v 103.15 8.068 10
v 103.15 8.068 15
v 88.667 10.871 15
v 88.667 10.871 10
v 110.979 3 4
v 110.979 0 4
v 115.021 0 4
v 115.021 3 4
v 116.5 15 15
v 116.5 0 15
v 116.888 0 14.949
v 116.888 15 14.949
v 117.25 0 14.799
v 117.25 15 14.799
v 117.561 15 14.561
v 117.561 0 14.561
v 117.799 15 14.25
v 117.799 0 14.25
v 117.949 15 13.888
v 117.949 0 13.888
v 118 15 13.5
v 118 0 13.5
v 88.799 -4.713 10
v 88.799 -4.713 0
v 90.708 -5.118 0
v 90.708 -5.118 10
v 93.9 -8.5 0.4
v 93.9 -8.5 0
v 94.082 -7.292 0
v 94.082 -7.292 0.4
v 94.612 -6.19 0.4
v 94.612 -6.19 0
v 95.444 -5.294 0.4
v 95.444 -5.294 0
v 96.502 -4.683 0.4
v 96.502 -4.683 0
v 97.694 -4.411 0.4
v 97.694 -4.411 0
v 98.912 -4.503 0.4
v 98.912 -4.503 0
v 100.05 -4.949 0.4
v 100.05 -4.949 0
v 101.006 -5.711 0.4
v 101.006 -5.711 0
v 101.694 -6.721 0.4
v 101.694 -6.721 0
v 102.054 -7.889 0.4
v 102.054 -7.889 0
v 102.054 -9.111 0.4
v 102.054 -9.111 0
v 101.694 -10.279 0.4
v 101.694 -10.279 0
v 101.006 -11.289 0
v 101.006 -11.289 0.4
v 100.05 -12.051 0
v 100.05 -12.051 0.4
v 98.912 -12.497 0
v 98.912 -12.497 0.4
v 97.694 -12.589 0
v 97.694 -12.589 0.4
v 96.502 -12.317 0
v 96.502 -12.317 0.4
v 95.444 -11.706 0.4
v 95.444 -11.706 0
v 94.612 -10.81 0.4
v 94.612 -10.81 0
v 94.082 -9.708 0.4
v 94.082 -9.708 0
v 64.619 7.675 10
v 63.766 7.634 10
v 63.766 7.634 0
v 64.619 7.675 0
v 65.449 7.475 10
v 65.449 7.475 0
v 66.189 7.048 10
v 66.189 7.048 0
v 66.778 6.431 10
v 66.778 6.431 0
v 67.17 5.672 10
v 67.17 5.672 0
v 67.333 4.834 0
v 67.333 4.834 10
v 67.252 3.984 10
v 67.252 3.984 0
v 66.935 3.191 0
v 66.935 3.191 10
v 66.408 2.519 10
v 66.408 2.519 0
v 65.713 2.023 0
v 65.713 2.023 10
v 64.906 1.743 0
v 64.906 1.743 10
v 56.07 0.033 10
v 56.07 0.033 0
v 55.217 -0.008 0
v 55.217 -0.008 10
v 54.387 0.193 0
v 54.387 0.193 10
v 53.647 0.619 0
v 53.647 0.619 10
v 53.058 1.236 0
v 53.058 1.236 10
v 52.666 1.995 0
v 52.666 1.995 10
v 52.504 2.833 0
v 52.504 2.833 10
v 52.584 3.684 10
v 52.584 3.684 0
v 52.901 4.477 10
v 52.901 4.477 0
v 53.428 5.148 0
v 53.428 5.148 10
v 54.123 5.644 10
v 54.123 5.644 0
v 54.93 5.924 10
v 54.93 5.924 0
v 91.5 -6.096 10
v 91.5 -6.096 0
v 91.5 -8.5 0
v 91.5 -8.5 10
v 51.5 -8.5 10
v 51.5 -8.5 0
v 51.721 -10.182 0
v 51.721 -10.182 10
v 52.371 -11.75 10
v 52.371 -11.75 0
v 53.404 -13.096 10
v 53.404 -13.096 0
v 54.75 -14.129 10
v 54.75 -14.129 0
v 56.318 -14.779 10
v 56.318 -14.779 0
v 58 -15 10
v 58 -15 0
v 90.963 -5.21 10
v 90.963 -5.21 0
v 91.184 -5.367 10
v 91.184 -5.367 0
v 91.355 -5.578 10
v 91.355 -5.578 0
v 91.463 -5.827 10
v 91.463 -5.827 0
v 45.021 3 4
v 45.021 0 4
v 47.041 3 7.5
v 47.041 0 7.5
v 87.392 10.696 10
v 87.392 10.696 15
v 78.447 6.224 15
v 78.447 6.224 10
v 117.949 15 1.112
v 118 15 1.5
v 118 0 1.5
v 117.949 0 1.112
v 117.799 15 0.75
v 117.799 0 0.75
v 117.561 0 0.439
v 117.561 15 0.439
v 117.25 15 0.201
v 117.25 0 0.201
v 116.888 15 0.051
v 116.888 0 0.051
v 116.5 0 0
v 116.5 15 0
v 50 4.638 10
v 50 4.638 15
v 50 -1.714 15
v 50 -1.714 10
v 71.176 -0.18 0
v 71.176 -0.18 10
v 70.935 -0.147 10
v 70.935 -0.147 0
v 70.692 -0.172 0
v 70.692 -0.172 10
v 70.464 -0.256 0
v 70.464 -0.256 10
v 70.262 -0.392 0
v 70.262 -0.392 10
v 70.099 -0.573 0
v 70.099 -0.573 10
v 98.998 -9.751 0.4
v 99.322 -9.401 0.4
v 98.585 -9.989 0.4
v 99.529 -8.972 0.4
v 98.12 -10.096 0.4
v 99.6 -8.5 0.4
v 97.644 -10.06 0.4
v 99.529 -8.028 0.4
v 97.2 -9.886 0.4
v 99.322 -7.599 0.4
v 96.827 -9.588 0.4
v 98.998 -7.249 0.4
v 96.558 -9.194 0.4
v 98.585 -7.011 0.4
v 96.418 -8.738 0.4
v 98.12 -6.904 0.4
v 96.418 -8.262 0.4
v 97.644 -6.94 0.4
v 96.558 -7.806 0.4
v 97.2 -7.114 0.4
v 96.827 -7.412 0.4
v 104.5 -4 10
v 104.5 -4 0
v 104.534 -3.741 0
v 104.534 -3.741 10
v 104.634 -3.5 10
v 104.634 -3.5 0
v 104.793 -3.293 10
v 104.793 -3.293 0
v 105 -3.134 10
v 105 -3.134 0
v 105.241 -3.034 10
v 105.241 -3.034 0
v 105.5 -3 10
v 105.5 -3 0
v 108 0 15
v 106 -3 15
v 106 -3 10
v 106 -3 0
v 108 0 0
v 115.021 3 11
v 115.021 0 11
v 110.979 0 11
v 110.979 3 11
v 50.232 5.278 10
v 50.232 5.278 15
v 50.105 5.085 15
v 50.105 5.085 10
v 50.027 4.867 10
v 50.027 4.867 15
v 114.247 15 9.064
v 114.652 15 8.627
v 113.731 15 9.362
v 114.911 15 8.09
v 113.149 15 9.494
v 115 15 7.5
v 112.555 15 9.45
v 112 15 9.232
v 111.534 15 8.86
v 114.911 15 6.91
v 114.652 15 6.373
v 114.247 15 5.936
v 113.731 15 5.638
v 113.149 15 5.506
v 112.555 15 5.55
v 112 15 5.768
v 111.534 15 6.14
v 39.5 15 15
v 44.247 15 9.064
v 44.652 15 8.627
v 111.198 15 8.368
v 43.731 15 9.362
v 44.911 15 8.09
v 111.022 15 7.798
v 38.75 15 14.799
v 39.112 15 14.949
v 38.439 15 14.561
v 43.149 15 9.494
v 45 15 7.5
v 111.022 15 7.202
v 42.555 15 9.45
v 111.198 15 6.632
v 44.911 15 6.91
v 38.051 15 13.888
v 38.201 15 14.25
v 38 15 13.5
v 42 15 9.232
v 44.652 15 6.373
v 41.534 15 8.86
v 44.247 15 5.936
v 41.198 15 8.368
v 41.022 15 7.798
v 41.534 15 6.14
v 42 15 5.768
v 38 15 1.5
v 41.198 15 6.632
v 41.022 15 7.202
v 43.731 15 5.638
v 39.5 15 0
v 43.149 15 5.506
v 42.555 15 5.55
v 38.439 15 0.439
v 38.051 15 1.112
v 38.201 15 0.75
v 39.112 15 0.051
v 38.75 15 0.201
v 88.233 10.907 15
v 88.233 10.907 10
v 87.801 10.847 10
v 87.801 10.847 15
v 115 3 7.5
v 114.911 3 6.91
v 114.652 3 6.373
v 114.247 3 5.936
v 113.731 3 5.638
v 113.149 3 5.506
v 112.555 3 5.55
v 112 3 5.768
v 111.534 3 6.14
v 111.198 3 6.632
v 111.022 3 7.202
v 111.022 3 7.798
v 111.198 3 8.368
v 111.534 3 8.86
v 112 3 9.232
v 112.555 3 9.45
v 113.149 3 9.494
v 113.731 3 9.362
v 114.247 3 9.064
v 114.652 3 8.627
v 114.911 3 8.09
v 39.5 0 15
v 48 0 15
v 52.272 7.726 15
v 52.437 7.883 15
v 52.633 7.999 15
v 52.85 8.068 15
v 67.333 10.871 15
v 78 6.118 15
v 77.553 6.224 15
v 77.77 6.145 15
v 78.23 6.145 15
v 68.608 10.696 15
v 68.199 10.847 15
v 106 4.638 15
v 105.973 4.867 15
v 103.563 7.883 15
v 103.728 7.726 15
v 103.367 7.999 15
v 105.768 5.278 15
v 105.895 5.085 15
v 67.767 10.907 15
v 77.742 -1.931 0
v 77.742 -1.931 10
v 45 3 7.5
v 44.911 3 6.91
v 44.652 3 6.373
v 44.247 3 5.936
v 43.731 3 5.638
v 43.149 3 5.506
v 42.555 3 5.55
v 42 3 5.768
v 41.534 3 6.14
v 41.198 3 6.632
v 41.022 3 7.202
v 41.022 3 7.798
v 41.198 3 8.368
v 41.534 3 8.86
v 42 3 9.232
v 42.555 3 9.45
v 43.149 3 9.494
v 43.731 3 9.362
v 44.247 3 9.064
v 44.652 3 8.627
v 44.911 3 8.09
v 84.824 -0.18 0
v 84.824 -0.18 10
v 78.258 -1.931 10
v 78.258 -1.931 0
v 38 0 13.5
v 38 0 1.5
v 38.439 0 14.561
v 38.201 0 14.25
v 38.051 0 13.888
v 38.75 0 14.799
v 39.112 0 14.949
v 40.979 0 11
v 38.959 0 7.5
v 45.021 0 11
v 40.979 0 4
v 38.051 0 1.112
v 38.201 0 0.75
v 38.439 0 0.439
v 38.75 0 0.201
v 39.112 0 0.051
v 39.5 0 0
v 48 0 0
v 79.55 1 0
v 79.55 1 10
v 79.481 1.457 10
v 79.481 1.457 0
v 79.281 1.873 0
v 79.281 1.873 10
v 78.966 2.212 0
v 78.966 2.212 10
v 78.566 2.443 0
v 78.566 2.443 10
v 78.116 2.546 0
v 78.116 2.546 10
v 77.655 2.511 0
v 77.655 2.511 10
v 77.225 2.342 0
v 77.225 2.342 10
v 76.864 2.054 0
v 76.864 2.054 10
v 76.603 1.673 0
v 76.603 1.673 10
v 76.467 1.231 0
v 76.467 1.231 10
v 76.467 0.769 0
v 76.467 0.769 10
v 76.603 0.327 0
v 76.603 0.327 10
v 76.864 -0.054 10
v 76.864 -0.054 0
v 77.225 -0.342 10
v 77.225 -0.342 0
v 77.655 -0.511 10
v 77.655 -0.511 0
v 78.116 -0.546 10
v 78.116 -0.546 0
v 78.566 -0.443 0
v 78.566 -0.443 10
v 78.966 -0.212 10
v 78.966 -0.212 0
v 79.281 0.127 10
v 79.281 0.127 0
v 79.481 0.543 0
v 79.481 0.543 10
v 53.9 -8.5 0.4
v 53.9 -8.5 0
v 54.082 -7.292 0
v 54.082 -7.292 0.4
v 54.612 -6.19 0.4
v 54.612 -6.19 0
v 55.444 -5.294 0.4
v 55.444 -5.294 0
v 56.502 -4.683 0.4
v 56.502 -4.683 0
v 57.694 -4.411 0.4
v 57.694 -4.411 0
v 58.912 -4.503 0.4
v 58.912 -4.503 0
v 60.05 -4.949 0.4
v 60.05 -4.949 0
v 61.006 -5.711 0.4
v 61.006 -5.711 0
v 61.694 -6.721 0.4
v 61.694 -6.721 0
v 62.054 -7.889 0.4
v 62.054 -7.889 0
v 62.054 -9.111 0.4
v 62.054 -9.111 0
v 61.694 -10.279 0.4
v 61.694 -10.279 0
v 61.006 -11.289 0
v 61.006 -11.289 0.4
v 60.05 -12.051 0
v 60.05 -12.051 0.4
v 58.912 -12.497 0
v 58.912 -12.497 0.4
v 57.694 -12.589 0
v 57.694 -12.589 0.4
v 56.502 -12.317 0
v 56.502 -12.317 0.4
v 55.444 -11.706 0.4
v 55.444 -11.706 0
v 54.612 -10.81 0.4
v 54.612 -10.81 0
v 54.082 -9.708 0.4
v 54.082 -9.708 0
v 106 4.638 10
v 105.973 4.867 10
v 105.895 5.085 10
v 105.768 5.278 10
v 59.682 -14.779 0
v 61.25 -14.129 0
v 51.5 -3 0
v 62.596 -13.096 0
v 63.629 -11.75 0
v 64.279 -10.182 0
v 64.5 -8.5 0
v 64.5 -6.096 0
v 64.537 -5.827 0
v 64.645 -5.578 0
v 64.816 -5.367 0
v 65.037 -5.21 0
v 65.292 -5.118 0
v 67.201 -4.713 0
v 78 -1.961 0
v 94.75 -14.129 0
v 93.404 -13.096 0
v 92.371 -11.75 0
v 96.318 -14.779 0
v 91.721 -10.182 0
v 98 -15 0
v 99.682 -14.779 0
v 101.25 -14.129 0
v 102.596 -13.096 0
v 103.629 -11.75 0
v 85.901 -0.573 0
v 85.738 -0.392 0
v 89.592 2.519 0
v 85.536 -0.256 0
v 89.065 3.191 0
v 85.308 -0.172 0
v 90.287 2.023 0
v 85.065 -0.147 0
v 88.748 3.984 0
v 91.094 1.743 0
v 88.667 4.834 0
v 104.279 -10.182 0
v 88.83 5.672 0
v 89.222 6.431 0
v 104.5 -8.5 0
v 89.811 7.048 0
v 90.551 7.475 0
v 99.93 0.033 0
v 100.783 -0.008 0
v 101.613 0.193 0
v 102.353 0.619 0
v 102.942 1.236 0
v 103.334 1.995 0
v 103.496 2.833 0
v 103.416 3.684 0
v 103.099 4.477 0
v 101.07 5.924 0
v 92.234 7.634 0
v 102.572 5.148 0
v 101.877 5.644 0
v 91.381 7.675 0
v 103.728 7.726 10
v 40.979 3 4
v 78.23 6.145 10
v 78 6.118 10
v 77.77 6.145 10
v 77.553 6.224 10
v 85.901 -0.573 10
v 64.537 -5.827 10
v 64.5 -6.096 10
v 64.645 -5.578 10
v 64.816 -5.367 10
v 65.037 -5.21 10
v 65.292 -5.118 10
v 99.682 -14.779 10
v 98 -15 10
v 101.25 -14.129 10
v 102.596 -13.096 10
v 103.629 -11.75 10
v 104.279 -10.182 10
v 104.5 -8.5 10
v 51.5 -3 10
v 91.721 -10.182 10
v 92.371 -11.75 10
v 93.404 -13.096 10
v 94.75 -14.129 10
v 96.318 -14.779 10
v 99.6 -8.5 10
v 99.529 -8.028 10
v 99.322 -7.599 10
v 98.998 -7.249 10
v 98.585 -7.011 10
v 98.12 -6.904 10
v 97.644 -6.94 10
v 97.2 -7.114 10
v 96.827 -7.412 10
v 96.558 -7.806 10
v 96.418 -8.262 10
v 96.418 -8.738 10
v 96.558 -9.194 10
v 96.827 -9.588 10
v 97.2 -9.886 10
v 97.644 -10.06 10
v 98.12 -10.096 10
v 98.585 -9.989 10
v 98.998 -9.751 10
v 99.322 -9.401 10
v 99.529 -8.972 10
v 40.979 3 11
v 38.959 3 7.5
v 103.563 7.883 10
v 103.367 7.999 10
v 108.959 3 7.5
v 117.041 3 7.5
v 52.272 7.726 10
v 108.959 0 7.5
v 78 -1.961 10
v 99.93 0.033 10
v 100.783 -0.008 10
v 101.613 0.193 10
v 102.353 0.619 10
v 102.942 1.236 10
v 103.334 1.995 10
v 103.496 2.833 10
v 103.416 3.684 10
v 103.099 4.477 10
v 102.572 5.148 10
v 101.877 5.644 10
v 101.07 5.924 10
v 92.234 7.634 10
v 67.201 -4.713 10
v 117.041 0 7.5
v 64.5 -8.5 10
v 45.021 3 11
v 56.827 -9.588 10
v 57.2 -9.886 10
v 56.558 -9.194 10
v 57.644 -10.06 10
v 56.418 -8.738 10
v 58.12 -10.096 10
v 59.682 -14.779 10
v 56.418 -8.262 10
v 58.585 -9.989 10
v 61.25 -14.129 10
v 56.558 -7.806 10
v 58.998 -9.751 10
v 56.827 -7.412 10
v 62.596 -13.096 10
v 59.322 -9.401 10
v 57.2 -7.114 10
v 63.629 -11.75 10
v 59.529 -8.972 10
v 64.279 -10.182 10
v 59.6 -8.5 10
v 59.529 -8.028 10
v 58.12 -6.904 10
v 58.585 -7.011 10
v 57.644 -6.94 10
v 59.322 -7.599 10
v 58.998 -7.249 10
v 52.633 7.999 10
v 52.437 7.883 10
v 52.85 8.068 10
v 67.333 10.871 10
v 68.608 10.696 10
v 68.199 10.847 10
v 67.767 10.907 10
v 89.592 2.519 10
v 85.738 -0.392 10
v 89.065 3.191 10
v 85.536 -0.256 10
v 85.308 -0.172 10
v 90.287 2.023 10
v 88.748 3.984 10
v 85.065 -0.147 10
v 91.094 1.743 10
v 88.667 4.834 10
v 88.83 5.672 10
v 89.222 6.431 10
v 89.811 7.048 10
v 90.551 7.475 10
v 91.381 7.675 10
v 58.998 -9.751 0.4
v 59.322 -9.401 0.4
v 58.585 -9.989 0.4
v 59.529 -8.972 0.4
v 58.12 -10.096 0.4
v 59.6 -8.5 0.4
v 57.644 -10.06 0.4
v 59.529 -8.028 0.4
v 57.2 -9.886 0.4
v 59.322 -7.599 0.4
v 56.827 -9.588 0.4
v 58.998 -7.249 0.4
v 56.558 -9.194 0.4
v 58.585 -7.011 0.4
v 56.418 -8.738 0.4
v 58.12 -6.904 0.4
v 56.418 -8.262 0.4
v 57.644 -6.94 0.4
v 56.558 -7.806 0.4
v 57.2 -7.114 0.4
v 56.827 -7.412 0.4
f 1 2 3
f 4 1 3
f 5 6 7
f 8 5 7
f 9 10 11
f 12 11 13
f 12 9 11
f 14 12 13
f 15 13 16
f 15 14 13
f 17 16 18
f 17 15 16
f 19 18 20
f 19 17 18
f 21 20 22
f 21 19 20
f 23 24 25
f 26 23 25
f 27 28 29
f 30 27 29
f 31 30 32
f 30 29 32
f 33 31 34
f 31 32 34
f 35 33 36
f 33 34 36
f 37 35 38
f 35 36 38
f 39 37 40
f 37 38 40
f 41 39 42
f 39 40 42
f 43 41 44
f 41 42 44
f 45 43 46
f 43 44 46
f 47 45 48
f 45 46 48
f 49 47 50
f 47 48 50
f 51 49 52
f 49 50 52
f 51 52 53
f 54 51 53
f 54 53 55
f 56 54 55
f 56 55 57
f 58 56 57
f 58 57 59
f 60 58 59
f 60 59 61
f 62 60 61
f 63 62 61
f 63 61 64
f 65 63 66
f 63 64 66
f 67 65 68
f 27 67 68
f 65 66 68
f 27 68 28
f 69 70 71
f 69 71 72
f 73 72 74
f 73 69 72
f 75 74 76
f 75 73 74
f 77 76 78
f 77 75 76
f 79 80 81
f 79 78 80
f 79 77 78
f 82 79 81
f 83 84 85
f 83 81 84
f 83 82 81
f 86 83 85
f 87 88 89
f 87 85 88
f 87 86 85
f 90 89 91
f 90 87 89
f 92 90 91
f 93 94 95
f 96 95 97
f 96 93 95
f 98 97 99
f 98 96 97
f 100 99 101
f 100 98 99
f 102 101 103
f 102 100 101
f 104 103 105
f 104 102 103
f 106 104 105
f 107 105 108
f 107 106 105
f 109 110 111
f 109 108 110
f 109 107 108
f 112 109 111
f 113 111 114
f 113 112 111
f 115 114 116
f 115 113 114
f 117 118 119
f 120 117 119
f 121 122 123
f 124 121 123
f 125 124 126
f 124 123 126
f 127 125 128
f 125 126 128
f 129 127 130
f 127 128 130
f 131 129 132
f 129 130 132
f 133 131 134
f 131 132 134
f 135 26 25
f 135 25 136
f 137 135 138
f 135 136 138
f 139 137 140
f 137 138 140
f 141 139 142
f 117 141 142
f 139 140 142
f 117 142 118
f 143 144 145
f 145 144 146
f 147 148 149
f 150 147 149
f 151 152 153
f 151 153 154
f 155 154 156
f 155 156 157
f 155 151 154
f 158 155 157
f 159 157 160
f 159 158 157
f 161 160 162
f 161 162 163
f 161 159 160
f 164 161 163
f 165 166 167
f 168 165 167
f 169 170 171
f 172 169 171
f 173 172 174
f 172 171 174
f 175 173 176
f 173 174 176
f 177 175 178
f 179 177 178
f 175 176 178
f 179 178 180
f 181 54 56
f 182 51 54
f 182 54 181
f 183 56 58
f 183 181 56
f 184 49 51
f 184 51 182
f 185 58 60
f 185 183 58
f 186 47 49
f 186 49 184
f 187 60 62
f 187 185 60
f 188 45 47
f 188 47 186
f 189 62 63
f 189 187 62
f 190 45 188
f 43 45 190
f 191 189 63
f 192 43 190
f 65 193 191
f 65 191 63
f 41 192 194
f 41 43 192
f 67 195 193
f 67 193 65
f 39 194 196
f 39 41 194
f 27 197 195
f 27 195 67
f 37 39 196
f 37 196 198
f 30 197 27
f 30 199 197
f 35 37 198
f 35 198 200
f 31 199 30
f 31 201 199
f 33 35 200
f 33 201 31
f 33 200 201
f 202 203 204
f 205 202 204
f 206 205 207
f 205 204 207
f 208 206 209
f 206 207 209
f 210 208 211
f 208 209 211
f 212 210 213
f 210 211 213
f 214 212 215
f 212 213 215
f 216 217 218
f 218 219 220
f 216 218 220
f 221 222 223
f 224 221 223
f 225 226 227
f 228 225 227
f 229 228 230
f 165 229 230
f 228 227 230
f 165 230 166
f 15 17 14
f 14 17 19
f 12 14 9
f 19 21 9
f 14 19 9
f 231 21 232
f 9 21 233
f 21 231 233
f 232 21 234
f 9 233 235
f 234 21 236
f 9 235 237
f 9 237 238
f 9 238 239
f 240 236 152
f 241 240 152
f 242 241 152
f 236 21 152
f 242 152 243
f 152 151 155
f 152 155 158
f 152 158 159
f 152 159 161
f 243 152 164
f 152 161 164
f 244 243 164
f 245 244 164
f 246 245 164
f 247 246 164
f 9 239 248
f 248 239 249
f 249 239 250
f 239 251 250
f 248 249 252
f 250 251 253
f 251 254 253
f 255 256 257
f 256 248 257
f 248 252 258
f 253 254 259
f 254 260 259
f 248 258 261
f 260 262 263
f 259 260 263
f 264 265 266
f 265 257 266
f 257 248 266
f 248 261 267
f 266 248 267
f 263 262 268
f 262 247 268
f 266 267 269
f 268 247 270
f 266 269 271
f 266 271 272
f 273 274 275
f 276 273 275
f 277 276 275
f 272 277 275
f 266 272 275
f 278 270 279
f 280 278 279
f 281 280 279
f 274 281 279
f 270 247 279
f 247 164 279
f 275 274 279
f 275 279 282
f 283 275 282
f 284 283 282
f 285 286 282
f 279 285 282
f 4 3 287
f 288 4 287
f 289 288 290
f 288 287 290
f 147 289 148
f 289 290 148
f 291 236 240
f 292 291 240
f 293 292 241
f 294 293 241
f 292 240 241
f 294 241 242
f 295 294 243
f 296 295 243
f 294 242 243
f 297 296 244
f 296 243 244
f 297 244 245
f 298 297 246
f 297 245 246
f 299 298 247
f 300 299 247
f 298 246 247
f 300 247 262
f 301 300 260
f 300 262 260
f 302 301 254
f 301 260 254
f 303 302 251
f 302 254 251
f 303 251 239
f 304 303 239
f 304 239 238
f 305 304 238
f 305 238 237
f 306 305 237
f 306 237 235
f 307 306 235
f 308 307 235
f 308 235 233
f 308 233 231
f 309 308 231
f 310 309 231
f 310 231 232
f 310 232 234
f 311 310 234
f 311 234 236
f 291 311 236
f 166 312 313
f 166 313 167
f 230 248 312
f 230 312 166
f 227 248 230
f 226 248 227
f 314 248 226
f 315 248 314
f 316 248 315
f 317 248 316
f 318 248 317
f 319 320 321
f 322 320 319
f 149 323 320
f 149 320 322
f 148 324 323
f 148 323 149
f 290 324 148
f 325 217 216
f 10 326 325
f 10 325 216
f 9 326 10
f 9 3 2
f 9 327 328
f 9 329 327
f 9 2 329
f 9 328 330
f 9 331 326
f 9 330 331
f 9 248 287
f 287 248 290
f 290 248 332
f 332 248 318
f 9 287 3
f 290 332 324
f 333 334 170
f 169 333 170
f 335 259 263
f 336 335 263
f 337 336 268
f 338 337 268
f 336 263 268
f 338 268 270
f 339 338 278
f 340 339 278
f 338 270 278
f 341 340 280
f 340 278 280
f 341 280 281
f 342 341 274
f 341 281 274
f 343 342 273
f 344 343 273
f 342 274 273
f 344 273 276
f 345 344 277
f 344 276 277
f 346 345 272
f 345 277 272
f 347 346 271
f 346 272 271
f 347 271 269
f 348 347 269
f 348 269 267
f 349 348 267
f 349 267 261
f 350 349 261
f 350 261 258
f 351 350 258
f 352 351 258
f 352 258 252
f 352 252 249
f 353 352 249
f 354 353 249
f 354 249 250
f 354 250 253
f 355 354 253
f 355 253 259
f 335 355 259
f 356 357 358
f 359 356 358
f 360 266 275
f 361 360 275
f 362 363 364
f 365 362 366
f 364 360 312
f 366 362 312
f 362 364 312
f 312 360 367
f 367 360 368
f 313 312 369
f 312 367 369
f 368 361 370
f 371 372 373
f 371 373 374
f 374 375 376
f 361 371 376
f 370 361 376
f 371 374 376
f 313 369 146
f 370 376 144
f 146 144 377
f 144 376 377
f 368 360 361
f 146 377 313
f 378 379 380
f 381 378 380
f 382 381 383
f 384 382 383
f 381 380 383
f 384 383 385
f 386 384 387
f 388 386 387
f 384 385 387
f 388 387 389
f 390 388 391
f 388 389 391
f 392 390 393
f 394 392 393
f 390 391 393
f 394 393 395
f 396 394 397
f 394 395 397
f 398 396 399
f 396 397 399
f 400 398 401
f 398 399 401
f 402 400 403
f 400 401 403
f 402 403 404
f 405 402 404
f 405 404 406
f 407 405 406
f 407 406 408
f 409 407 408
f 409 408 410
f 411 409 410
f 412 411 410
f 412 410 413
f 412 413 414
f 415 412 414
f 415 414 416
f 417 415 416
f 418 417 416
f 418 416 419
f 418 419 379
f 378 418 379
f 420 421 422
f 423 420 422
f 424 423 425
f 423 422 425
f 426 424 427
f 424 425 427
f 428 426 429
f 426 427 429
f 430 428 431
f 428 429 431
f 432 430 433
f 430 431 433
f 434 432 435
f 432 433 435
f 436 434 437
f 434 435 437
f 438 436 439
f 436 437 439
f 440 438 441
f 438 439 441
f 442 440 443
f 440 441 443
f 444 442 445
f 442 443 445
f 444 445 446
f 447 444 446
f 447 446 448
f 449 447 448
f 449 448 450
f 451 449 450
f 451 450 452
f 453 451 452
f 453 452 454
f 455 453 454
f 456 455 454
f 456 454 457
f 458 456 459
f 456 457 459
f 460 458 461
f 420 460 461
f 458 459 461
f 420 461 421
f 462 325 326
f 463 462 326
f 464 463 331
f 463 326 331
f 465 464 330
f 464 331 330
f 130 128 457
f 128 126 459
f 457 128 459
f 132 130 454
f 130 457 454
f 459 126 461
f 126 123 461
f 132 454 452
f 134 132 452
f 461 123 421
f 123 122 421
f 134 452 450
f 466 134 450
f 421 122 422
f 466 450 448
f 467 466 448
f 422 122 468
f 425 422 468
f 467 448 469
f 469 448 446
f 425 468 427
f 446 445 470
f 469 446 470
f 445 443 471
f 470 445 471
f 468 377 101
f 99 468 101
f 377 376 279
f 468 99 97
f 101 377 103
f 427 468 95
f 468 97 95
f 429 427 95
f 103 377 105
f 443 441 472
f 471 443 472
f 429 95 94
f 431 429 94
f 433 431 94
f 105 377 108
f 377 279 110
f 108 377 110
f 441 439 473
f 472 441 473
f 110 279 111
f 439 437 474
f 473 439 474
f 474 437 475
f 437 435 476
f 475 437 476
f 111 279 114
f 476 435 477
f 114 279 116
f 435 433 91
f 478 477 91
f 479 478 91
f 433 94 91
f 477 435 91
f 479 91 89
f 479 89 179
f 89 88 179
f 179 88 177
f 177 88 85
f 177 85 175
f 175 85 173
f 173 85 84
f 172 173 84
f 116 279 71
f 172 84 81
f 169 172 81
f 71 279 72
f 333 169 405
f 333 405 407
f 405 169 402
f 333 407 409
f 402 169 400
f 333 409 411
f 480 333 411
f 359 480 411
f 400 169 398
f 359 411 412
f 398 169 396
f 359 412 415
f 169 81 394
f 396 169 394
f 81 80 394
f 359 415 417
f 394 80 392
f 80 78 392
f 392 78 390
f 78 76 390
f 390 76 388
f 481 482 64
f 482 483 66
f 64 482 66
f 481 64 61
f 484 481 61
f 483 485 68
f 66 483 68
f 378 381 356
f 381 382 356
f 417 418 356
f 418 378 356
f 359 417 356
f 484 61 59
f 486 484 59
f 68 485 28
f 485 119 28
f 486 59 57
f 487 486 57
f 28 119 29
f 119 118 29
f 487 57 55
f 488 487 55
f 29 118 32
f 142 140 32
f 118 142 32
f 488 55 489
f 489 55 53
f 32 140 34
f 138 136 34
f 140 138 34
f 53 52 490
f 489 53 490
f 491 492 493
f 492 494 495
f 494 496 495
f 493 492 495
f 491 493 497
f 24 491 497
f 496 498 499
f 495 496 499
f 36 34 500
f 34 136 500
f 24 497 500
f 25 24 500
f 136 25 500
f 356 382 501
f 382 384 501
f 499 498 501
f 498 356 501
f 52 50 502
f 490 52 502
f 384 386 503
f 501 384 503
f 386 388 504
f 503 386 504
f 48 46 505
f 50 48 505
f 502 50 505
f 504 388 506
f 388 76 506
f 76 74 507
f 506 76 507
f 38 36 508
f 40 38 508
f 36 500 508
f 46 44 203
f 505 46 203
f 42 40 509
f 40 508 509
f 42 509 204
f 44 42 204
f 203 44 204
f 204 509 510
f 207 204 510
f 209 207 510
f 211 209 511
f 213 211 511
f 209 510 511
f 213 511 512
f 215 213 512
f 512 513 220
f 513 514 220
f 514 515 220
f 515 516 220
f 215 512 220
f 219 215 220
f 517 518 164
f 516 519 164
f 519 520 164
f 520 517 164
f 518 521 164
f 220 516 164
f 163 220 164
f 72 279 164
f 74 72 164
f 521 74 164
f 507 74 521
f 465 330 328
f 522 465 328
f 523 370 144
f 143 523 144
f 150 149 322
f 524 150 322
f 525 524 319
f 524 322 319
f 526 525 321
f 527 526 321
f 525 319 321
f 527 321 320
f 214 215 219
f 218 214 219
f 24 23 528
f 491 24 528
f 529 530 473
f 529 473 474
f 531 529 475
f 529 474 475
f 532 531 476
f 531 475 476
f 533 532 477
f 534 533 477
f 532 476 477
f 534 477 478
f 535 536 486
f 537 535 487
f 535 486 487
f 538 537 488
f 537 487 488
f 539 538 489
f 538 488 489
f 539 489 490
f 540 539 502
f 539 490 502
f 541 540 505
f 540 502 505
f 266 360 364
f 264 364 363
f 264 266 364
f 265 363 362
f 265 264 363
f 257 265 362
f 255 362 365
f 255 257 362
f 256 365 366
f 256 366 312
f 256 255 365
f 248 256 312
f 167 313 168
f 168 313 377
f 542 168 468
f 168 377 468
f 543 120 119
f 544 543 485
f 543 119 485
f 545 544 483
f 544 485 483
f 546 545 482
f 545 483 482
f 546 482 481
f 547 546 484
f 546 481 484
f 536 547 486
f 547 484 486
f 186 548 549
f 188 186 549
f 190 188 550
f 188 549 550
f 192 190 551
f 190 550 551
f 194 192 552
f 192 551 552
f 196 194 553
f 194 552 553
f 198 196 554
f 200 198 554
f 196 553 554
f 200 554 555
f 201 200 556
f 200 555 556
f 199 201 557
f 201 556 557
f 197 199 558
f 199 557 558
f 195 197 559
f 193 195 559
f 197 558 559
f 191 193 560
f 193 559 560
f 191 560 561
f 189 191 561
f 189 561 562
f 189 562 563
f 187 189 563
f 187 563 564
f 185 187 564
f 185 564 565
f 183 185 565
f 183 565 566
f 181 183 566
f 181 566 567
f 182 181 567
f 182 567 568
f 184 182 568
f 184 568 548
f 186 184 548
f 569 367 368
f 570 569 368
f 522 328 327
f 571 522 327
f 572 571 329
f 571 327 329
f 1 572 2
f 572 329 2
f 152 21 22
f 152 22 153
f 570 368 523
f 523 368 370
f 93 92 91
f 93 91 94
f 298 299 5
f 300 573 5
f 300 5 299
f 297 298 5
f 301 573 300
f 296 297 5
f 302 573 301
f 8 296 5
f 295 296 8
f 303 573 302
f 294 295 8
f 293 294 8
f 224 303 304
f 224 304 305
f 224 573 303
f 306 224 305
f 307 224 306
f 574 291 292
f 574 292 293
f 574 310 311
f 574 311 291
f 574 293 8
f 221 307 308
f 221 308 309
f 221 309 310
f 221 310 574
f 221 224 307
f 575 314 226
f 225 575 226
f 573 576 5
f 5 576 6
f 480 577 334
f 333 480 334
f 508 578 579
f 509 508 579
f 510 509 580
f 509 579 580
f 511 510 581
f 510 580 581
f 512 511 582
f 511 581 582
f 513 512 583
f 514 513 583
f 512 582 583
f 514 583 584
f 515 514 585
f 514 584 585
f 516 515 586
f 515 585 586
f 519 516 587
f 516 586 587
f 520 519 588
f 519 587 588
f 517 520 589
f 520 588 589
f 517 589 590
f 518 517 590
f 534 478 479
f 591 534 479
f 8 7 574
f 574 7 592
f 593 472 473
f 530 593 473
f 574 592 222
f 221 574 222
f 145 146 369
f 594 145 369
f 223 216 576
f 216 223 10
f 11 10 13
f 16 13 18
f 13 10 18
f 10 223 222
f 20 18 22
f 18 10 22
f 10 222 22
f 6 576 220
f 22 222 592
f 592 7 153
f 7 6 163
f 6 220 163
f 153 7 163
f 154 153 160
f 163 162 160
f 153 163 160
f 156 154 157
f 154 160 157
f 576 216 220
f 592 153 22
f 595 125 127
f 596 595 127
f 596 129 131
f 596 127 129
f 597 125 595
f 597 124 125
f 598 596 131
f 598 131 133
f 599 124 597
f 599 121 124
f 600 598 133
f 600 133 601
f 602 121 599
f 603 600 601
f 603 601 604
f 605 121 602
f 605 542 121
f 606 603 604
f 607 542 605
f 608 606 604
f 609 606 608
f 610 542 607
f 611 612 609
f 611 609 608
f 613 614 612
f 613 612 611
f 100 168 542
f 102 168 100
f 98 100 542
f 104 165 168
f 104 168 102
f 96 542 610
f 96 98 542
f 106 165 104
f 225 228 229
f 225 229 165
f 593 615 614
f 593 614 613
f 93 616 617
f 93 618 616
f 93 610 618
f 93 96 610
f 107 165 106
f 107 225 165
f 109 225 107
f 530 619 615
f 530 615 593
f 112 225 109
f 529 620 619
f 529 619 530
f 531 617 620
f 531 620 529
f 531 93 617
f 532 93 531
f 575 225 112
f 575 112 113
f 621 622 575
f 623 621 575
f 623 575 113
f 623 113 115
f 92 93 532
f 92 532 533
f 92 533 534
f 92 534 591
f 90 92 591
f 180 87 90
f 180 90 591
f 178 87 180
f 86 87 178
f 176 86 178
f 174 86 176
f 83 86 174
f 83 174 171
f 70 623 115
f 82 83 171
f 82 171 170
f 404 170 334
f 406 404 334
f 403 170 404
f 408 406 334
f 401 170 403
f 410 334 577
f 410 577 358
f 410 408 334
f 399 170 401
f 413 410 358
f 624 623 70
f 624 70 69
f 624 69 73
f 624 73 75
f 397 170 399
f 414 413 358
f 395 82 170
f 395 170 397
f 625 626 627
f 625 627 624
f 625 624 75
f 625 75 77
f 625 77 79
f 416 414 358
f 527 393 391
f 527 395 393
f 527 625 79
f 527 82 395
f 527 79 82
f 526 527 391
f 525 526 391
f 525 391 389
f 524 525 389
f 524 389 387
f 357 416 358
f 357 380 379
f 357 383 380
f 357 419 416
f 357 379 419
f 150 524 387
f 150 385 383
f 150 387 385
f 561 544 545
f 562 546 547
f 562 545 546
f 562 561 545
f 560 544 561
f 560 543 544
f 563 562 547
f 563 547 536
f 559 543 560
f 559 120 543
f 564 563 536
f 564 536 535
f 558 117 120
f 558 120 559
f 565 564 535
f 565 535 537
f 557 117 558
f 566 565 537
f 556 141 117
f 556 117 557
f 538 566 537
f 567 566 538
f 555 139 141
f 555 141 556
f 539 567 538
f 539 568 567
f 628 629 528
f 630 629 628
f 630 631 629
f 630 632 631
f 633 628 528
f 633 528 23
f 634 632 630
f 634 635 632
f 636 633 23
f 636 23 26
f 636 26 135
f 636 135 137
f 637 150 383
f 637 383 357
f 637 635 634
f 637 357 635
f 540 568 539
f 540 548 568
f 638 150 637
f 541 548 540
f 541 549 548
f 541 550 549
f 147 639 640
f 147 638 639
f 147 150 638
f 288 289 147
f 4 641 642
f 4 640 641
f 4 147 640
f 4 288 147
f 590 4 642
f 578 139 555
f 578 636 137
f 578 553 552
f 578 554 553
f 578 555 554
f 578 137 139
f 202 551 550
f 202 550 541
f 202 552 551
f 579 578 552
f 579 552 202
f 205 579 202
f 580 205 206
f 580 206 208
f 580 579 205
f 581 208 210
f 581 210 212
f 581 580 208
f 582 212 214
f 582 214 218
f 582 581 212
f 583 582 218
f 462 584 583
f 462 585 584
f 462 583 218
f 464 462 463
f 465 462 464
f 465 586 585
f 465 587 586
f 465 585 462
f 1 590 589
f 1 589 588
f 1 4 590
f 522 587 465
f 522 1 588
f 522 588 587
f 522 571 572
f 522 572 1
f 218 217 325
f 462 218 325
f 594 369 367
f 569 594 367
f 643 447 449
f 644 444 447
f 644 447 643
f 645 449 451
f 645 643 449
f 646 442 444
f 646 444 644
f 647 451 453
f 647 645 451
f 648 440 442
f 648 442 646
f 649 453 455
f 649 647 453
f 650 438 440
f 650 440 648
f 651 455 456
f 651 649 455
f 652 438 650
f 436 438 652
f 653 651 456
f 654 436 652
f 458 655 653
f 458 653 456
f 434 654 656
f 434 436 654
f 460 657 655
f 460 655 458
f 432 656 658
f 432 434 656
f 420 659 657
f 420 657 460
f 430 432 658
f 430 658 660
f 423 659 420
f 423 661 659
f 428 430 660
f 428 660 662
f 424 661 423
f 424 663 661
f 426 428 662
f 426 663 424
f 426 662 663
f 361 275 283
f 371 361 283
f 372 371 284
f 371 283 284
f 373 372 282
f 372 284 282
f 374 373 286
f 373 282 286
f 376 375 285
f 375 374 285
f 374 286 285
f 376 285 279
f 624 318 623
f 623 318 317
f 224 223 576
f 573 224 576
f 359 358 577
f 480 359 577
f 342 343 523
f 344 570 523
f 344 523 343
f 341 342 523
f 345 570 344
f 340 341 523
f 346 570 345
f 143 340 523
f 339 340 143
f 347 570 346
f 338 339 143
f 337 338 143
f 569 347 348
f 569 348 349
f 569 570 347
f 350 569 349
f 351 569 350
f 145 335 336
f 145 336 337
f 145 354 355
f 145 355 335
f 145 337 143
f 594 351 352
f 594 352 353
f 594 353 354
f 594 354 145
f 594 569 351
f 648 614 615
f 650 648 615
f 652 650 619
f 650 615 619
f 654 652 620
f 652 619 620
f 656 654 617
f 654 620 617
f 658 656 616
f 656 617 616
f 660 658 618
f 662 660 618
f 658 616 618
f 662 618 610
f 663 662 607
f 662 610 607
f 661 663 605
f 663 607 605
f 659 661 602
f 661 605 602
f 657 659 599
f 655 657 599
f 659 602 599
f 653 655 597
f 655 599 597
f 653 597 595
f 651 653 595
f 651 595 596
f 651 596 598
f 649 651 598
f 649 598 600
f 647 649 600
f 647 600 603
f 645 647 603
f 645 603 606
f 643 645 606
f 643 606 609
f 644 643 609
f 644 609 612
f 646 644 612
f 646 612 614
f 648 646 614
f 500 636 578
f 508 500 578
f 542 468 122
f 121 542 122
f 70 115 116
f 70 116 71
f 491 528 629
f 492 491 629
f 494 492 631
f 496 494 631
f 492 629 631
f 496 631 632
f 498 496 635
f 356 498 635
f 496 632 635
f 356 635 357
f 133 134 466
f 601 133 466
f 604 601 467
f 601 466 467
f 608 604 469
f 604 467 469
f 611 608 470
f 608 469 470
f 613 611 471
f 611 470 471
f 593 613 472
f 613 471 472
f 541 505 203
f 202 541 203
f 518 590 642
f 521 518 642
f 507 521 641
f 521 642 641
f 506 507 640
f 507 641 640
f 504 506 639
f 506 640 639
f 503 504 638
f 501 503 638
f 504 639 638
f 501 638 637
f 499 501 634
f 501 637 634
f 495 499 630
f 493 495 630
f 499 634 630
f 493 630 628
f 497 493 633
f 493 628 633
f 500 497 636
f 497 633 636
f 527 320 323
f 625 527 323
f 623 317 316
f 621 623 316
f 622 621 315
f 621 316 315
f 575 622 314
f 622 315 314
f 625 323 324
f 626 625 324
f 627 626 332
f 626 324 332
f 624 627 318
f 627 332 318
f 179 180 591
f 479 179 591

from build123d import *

# Parameters (mm, degrees)
BOSS_EXTRUDE1_DEPTH = 15
CUT_EXTRUDE7_DEPTH  = 5
CUT_EXTRUDE8_DEPTH  = 35
SKETCH3_R           = 1.55
CUT_EXTRUDE10_DEPTH = 32
SKETCH10_R          = 1.6
CUT_EXTRUDE11_DEPTH = 32
SKETCH11_R          = 4.1
CUT_EXTRUDE12_DEPTH = 0.4
CUT_EXTRUDE13_DEPTH = 32
SKETCH14_R          = 2
CUT_EXTRUDE14_DEPTH = 22
CUT_EXTRUDE15_DEPTH = 3
SKETCH16_W          = 38
SKETCH16_H          = 15
CUT_EXTRUDE16_DEPTH = 20
CUT_EXTRUDE17_DEPTH = 20


with BuildPart() as part:
    # Sketch1 → Boss-Extrude1 (new body)
    with BuildSketch(Plane.XY):
        Polygon((0, 0), (48, 0), (48, -15), (108, -15), (108, 0), (156, 0), (156, 15), (0, 15), align=None)
    extrude(amount=BOSS_EXTRUDE1_DEPTH)

    # Sketch2 → Cut-Extrude7 (cut)
    with BuildSketch(Plane.XY.offset(15)):
        with BuildLine():
            Line((77.552786405, 6.223606798), (68.60756702, 10.69621649))
            ThreePointArc((68.60756702, 10.69621649), (67.984760984, 10.888831752), (67.333096015, 10.870921809))
            Line((67.333096015, 10.870921809), (52.849985824, 8.067739192))
            ThreePointArc((52.849985824, 8.067739192), (52.531353266, 7.946930093), (52.271786451, 7.726143741))
            Line((52.271786451, 7.726143741), (50.23177872, 5.278134464))
            ThreePointArc((50.23177872, 5.278134464), (50.059728422, 4.978375329), (50, 4.637950065))
            Line((50, 4.637950065), (50, -15))
            Line((50, -15), (106, -15))
            Line((106, -15), (106, 4.637950065))
            ThreePointArc((106, 4.637950065), (105.940271578, 4.978375329), (105.76822128, 5.278134464))
            Line((105.76822128, 5.278134464), (103.728213549, 7.726143741))
            ThreePointArc((103.728213549, 7.726143741), (103.468646734, 7.946930093), (103.150014176, 8.067739192))
            Line((103.150014176, 8.067739192), (88.666903985, 10.870921809))
            ThreePointArc((88.666903985, 10.870921809), (88.015239016, 10.888831752), (87.39243298, 10.69621649))
            Line((87.39243298, 10.69621649), (78.447213595, 6.223606798))
            ThreePointArc((78.447213595, 6.223606798), (78, 6.118033989), (77.552786405, 6.223606798))
        make_face()
    extrude(amount=-CUT_EXTRUDE7_DEPTH, mode=Mode.SUBTRACT)

    # Sketch4 → Cut-Extrude8 (cut)
    with BuildSketch(Plane.XY.offset(15)):
        with BuildLine():
            Line((78.257662651, -1.93128996), (78, -1.960923359))
            Line((78, -1.960923359), (77.742337349, -1.93128996))
            Line((77.742337349, -1.93128996), (71.175803726, -0.180214327))
            ThreePointArc((71.175803726, -0.180214327), (70.575493167, -0.206985371), (70.098909155, -0.572986922))
            Line((70.098909155, -0.572986922), (67.200935386, -4.712949448))
            ThreePointArc((67.200935386, -4.712949448), (67.05739096, -5.016112502), (67.022171235, -5.349687697))
            Line((67.022171235, -5.349687697), (67.574638514, -14.063275904))
            ThreePointArc((67.574638514, -14.063275904), (67.888264768, -14.729135071), (68.572634586, -15))
            Line((68.572634586, -15), (87.427365414, -15))
            ThreePointArc((87.427365414, -15), (88.111735232, -14.729135071), (88.425361486, -14.063275904))
            Line((88.425361486, -14.063275904), (88.977828765, -5.349687697))
            ThreePointArc((88.977828765, -5.349687697), (88.94260904, -5.016112502), (88.799064614, -4.712949448))
            Line((88.799064614, -4.712949448), (85.901090845, -0.572986922))
            ThreePointArc((85.901090845, -0.572986922), (85.424506833, -0.206985371), (84.824196274, -0.180214327))
            Line((84.824196274, -0.180214327), (78.257662651, -1.93128996))
        make_face()
    extrude(amount=-CUT_EXTRUDE8_DEPTH, mode=Mode.SUBTRACT)

    # Sketch3 → Cut-Extrude10 (cut)
    with BuildSketch(Plane.XY.offset(15)):
        with Locations((78, 1)):
            Circle(SKETCH3_R)
    extrude(amount=-CUT_EXTRUDE10_DEPTH, mode=Mode.SUBTRACT)

    # Sketch10 → Cut-Extrude11 (cut)
    with BuildSketch(Plane.XY.offset(10)):
        with Locations((98, -8.5)):
            Circle(SKETCH10_R)
        with Locations((58, -8.5)):
            Circle(SKETCH10_R)
        with BuildLine():
            Line((54.92993428, 5.92391415), (63.765952936, 7.634111309))
            ThreePointArc((63.765952936, 7.634111309), (67.281358207, 5.258837477), (64.906084375, 1.743432206))
            Line((64.906084375, 1.743432206), (56.07006572, 0.033235047))
            ThreePointArc((56.07006572, 0.033235047), (52.554660448, 2.408508879), (54.92993428, 5.92391415))
        make_face()
        with BuildLine():
            Line((101.07006572, 5.92391415), (92.234047064, 7.634111309))
            ThreePointArc((92.234047064, 7.634111309), (88.718641793, 5.258837477), (91.093915625, 1.743432206))
            Line((91.093915625, 1.743432206), (99.92993428, 0.033235047))
            ThreePointArc((99.92993428, 0.033235047), (103.445339552, 2.408508879), (101.07006572, 5.92391415))
        make_face()
    extrude(amount=-CUT_EXTRUDE11_DEPTH, mode=Mode.SUBTRACT)

    # Sketch11 → Cut-Extrude12 (cut)
    with BuildSketch(Plane(origin=(0, 0, 0), x_dir=(-1, 0, 0), z_dir=(0, 0, -1))):
        with Locations((-58, -8.5)):
            Circle(SKETCH11_R)
        with Locations((-98, -8.5)):
            Circle(SKETCH11_R)
    extrude(amount=-CUT_EXTRUDE12_DEPTH, mode=Mode.SUBTRACT)

    # Sketch13 → Cut-Extrude13 (cut)
    with BuildSketch(Plane(origin=(0, 0, 0), x_dir=(-1, 0, 0), z_dir=(0, 0, -1))):
        with BuildLine():
            Line((-108, -15), (-98, -15))
            ThreePointArc((-98, -15), (-102.596194078, -13.096194078), (-104.5, -8.5))
            Line((-104.5, -8.5), (-104.5, -4))
            ThreePointArc((-104.5, -4), (-104.792893219, -3.292893219), (-105.5, -3))
            Line((-105.5, -3), (-106, -3))
            Line((-106, -3), (-108, 0))
            Line((-108, 0), (-108, -15))
        make_face()
        with BuildLine():
            Line((-91.5, -6.096383305), (-91.5, -8.5))
            ThreePointArc((-91.5, -8.5), (-93.403805922, -13.096194078), (-98, -15))
            Line((-98, -15), (-87.427365414, -15))
            Line((-87.427365414, -15), (-88.799064614, -4.712949448))
            Line((-88.799064614, -4.712949448), (-90.707690196, -5.11818865))
            ThreePointArc((-90.707690196, -5.11818865), (-91.277074706, -5.46697493), (-91.5, -6.096383305))
        make_face()
        with BuildLine():
            ThreePointArc((-51.5, -8.5), (-53.403805922, -13.096194078), (-58, -15))
            Line((-58, -15), (-48, -15))
            Line((-48, -15), (-48, 0))
            Line((-48, 0), (-51.5, -3))
            Line((-51.5, -3), (-51.5, -8.5))
        make_face()
        with BuildLine():
            Line((-67.200935386, -4.712949448), (-68.572634586, -15))
            Line((-68.572634586, -15), (-58, -15))
            ThreePointArc((-58, -15), (-62.596194078, -13.096194078), (-64.5, -8.5))
            Line((-64.5, -8.5), (-64.5, -6.096383305))
            ThreePointArc((-64.5, -6.096383305), (-64.722925294, -5.46697493), (-65.292309804, -5.11818865))
            Line((-65.292309804, -5.11818865), (-67.200935386, -4.712949448))
        make_face()
    extrude(amount=-CUT_EXTRUDE13_DEPTH, mode=Mode.SUBTRACT)

    # Sketch14 → Cut-Extrude14 (cut)
    with BuildSketch(Plane(origin=(0, 15, 0), x_dir=(1, 0, 0), z_dir=(0, 1, 0))):
        with Locations((113, -7.5)):
            Circle(SKETCH14_R)
        with Locations((43, -7.5)):
            Circle(SKETCH14_R)
    extrude(amount=-CUT_EXTRUDE14_DEPTH, mode=Mode.SUBTRACT)

    # Sketch15 → Cut-Extrude15 (cut)
    with BuildSketch(Plane.XZ):
        Polygon((117.041451884, 7.5), (115.020725942, 11), (110.979274058, 11), (108.958548116, 7.5), (110.979274058, 4), (115.020725942, 4), align=None)
        Polygon((38.958548116, 7.5), (40.979274058, 4), (45.020725942, 4), (47.041451884, 7.5), (45.020725942, 11), (40.979274058, 11), align=None)
    extrude(amount=-CUT_EXTRUDE15_DEPTH, mode=Mode.SUBTRACT)

    # Sketch16 → Cut-Extrude16 (cut)
    with BuildSketch(Plane(origin=(0, 15, 0), x_dir=(1, 0, 0), z_dir=(0, 1, 0))):
        with Locations((137, -7.5)):
            Rectangle(SKETCH16_W, SKETCH16_H)
        with Locations((19, -7.5)):
            Rectangle(SKETCH16_W, SKETCH16_H)
    extrude(amount=-CUT_EXTRUDE16_DEPTH, mode=Mode.SUBTRACT)

    # Sketch17 → Cut-Extrude17 (cut)
    with BuildSketch(Plane(origin=(0, 15, 0), x_dir=(1, 0, 0), z_dir=(0, 1, 0))):
        with BuildLine():
            Line((118, -13.5), (118, -15))
            Line((118, -15), (116.5, -15))
            ThreePointArc((116.5, -15), (117.560660172, -14.560660172), (118, -13.5))
        make_face()
        with BuildLine():
            Line((116.5, 0), (118, 0))
            Line((118, 0), (118, -1.5))
            ThreePointArc((118, -1.5), (117.560660172, -0.439339828), (116.5, 0))
        make_face()
        with BuildLine():
            Line((39.5, 0), (38, 0))
            Line((38, 0), (38, -1.5))
            ThreePointArc((38, -1.5), (38.439339828, -0.439339828), (39.5, 0))
        make_face()
        with BuildLine():
            Line((39.5, -15), (38, -15))
            Line((38, -15), (38, -13.5))
            ThreePointArc((38, -13.5), (38.439339828, -14.560660172), (39.5, -15))
        make_face()
    extrude(amount=-CUT_EXTRUDE17_DEPTH, mode=Mode.SUBTRACT)


solid = part.part
